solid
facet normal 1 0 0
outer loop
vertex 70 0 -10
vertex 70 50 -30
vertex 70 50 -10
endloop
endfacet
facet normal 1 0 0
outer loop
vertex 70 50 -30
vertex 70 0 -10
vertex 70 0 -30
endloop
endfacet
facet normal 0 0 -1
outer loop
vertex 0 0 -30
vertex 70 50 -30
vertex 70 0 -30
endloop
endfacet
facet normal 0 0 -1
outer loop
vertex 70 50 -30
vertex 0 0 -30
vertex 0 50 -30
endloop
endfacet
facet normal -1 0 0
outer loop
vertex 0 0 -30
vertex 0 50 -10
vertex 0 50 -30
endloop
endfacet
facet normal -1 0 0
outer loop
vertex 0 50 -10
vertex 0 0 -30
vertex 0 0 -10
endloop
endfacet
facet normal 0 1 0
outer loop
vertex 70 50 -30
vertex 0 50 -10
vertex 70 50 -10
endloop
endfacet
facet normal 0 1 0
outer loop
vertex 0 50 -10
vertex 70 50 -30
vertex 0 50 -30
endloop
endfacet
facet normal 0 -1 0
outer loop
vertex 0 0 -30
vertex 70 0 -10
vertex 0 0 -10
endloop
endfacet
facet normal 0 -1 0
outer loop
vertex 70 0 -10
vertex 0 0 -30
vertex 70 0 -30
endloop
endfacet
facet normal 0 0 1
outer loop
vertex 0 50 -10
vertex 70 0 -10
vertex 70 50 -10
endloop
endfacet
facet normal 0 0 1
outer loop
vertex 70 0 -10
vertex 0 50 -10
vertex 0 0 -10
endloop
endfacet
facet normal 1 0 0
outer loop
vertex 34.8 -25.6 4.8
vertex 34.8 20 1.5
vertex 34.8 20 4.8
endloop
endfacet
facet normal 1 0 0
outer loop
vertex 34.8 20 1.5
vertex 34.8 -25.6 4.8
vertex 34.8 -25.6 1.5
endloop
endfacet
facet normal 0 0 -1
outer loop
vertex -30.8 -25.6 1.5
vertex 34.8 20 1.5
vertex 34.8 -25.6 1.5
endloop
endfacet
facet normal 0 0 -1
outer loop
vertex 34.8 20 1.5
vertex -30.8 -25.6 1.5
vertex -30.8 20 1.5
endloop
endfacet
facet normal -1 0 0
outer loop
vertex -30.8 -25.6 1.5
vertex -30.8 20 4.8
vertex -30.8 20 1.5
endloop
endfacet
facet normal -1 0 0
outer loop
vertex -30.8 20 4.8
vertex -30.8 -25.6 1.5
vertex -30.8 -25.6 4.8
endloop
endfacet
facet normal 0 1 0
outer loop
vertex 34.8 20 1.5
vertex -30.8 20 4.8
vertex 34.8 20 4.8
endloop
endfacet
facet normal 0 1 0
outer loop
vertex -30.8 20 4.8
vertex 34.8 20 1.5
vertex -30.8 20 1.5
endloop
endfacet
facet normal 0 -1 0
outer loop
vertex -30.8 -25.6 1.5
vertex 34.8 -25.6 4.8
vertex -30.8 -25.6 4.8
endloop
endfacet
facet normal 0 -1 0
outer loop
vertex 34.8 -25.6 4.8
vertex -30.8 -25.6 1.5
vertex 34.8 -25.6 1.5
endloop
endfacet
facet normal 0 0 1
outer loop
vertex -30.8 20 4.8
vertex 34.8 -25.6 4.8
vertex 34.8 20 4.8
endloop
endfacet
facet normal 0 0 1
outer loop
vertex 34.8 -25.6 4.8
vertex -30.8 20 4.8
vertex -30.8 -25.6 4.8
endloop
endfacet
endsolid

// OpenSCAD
// Part 1: Box enclosure
$fn = 64;

translate([0, 0, -30])
cube([70, 50, 2]);

translate([0, 0, -28])
cube([70, 50, 2]);

translate([0, 0, -26])
cube([70, 50, 2]);

translate([0, 0, -24])
cube([70, 50, 2]);

translate([0, 0, -22])
cube([70, 50, 2]);

translate([0, 0, -20])
cube([70, 50, 2]);

translate([0, 0, -18])
cube([70, 50, 2]);

translate([0, 0, -16])
cube([70, 50, 2]);

translate([0, 0, -14])
cube([70, 50, 2]);

translate([0, 0, -12])
cube([70, 50, 2]);

// Part 2: Lid
$fn = 64;

translate([-30.8, -25.6, 1.5])
cube([65.6, 45.6, 1.5]);

translate([-30.8, -25.6, 1.7])
cube([65.6, 45.6, 1.5]);

translate([-30.8, -25.6, 1.9])
cube([65.6, 45.6, 1.5]);

translate([-30.8, -25.6, 2.1])
cube([65.6, 45.6, 1.5]);

translate([-30.8, -25.6, 2.3])
cube([65.6, 45.6, 1.5]);

translate([-30.8, -25.6, 2.5])
cube([65.6, 45.6, 1.5]);

translate([-30.8, -25.6, 2.7])
cube([65.6, 45.6, 1.5]);

translate([-30.8, -25.6, 2.9])
cube([65.6, 45.6, 1.5]);

translate([-30.8, -25.6, 3.1])
cube([65.6, 45.6, 1.5]);

translate([-30.8, -25.6, 3.3])
cube([65.6, 45.6, 1.5]);
